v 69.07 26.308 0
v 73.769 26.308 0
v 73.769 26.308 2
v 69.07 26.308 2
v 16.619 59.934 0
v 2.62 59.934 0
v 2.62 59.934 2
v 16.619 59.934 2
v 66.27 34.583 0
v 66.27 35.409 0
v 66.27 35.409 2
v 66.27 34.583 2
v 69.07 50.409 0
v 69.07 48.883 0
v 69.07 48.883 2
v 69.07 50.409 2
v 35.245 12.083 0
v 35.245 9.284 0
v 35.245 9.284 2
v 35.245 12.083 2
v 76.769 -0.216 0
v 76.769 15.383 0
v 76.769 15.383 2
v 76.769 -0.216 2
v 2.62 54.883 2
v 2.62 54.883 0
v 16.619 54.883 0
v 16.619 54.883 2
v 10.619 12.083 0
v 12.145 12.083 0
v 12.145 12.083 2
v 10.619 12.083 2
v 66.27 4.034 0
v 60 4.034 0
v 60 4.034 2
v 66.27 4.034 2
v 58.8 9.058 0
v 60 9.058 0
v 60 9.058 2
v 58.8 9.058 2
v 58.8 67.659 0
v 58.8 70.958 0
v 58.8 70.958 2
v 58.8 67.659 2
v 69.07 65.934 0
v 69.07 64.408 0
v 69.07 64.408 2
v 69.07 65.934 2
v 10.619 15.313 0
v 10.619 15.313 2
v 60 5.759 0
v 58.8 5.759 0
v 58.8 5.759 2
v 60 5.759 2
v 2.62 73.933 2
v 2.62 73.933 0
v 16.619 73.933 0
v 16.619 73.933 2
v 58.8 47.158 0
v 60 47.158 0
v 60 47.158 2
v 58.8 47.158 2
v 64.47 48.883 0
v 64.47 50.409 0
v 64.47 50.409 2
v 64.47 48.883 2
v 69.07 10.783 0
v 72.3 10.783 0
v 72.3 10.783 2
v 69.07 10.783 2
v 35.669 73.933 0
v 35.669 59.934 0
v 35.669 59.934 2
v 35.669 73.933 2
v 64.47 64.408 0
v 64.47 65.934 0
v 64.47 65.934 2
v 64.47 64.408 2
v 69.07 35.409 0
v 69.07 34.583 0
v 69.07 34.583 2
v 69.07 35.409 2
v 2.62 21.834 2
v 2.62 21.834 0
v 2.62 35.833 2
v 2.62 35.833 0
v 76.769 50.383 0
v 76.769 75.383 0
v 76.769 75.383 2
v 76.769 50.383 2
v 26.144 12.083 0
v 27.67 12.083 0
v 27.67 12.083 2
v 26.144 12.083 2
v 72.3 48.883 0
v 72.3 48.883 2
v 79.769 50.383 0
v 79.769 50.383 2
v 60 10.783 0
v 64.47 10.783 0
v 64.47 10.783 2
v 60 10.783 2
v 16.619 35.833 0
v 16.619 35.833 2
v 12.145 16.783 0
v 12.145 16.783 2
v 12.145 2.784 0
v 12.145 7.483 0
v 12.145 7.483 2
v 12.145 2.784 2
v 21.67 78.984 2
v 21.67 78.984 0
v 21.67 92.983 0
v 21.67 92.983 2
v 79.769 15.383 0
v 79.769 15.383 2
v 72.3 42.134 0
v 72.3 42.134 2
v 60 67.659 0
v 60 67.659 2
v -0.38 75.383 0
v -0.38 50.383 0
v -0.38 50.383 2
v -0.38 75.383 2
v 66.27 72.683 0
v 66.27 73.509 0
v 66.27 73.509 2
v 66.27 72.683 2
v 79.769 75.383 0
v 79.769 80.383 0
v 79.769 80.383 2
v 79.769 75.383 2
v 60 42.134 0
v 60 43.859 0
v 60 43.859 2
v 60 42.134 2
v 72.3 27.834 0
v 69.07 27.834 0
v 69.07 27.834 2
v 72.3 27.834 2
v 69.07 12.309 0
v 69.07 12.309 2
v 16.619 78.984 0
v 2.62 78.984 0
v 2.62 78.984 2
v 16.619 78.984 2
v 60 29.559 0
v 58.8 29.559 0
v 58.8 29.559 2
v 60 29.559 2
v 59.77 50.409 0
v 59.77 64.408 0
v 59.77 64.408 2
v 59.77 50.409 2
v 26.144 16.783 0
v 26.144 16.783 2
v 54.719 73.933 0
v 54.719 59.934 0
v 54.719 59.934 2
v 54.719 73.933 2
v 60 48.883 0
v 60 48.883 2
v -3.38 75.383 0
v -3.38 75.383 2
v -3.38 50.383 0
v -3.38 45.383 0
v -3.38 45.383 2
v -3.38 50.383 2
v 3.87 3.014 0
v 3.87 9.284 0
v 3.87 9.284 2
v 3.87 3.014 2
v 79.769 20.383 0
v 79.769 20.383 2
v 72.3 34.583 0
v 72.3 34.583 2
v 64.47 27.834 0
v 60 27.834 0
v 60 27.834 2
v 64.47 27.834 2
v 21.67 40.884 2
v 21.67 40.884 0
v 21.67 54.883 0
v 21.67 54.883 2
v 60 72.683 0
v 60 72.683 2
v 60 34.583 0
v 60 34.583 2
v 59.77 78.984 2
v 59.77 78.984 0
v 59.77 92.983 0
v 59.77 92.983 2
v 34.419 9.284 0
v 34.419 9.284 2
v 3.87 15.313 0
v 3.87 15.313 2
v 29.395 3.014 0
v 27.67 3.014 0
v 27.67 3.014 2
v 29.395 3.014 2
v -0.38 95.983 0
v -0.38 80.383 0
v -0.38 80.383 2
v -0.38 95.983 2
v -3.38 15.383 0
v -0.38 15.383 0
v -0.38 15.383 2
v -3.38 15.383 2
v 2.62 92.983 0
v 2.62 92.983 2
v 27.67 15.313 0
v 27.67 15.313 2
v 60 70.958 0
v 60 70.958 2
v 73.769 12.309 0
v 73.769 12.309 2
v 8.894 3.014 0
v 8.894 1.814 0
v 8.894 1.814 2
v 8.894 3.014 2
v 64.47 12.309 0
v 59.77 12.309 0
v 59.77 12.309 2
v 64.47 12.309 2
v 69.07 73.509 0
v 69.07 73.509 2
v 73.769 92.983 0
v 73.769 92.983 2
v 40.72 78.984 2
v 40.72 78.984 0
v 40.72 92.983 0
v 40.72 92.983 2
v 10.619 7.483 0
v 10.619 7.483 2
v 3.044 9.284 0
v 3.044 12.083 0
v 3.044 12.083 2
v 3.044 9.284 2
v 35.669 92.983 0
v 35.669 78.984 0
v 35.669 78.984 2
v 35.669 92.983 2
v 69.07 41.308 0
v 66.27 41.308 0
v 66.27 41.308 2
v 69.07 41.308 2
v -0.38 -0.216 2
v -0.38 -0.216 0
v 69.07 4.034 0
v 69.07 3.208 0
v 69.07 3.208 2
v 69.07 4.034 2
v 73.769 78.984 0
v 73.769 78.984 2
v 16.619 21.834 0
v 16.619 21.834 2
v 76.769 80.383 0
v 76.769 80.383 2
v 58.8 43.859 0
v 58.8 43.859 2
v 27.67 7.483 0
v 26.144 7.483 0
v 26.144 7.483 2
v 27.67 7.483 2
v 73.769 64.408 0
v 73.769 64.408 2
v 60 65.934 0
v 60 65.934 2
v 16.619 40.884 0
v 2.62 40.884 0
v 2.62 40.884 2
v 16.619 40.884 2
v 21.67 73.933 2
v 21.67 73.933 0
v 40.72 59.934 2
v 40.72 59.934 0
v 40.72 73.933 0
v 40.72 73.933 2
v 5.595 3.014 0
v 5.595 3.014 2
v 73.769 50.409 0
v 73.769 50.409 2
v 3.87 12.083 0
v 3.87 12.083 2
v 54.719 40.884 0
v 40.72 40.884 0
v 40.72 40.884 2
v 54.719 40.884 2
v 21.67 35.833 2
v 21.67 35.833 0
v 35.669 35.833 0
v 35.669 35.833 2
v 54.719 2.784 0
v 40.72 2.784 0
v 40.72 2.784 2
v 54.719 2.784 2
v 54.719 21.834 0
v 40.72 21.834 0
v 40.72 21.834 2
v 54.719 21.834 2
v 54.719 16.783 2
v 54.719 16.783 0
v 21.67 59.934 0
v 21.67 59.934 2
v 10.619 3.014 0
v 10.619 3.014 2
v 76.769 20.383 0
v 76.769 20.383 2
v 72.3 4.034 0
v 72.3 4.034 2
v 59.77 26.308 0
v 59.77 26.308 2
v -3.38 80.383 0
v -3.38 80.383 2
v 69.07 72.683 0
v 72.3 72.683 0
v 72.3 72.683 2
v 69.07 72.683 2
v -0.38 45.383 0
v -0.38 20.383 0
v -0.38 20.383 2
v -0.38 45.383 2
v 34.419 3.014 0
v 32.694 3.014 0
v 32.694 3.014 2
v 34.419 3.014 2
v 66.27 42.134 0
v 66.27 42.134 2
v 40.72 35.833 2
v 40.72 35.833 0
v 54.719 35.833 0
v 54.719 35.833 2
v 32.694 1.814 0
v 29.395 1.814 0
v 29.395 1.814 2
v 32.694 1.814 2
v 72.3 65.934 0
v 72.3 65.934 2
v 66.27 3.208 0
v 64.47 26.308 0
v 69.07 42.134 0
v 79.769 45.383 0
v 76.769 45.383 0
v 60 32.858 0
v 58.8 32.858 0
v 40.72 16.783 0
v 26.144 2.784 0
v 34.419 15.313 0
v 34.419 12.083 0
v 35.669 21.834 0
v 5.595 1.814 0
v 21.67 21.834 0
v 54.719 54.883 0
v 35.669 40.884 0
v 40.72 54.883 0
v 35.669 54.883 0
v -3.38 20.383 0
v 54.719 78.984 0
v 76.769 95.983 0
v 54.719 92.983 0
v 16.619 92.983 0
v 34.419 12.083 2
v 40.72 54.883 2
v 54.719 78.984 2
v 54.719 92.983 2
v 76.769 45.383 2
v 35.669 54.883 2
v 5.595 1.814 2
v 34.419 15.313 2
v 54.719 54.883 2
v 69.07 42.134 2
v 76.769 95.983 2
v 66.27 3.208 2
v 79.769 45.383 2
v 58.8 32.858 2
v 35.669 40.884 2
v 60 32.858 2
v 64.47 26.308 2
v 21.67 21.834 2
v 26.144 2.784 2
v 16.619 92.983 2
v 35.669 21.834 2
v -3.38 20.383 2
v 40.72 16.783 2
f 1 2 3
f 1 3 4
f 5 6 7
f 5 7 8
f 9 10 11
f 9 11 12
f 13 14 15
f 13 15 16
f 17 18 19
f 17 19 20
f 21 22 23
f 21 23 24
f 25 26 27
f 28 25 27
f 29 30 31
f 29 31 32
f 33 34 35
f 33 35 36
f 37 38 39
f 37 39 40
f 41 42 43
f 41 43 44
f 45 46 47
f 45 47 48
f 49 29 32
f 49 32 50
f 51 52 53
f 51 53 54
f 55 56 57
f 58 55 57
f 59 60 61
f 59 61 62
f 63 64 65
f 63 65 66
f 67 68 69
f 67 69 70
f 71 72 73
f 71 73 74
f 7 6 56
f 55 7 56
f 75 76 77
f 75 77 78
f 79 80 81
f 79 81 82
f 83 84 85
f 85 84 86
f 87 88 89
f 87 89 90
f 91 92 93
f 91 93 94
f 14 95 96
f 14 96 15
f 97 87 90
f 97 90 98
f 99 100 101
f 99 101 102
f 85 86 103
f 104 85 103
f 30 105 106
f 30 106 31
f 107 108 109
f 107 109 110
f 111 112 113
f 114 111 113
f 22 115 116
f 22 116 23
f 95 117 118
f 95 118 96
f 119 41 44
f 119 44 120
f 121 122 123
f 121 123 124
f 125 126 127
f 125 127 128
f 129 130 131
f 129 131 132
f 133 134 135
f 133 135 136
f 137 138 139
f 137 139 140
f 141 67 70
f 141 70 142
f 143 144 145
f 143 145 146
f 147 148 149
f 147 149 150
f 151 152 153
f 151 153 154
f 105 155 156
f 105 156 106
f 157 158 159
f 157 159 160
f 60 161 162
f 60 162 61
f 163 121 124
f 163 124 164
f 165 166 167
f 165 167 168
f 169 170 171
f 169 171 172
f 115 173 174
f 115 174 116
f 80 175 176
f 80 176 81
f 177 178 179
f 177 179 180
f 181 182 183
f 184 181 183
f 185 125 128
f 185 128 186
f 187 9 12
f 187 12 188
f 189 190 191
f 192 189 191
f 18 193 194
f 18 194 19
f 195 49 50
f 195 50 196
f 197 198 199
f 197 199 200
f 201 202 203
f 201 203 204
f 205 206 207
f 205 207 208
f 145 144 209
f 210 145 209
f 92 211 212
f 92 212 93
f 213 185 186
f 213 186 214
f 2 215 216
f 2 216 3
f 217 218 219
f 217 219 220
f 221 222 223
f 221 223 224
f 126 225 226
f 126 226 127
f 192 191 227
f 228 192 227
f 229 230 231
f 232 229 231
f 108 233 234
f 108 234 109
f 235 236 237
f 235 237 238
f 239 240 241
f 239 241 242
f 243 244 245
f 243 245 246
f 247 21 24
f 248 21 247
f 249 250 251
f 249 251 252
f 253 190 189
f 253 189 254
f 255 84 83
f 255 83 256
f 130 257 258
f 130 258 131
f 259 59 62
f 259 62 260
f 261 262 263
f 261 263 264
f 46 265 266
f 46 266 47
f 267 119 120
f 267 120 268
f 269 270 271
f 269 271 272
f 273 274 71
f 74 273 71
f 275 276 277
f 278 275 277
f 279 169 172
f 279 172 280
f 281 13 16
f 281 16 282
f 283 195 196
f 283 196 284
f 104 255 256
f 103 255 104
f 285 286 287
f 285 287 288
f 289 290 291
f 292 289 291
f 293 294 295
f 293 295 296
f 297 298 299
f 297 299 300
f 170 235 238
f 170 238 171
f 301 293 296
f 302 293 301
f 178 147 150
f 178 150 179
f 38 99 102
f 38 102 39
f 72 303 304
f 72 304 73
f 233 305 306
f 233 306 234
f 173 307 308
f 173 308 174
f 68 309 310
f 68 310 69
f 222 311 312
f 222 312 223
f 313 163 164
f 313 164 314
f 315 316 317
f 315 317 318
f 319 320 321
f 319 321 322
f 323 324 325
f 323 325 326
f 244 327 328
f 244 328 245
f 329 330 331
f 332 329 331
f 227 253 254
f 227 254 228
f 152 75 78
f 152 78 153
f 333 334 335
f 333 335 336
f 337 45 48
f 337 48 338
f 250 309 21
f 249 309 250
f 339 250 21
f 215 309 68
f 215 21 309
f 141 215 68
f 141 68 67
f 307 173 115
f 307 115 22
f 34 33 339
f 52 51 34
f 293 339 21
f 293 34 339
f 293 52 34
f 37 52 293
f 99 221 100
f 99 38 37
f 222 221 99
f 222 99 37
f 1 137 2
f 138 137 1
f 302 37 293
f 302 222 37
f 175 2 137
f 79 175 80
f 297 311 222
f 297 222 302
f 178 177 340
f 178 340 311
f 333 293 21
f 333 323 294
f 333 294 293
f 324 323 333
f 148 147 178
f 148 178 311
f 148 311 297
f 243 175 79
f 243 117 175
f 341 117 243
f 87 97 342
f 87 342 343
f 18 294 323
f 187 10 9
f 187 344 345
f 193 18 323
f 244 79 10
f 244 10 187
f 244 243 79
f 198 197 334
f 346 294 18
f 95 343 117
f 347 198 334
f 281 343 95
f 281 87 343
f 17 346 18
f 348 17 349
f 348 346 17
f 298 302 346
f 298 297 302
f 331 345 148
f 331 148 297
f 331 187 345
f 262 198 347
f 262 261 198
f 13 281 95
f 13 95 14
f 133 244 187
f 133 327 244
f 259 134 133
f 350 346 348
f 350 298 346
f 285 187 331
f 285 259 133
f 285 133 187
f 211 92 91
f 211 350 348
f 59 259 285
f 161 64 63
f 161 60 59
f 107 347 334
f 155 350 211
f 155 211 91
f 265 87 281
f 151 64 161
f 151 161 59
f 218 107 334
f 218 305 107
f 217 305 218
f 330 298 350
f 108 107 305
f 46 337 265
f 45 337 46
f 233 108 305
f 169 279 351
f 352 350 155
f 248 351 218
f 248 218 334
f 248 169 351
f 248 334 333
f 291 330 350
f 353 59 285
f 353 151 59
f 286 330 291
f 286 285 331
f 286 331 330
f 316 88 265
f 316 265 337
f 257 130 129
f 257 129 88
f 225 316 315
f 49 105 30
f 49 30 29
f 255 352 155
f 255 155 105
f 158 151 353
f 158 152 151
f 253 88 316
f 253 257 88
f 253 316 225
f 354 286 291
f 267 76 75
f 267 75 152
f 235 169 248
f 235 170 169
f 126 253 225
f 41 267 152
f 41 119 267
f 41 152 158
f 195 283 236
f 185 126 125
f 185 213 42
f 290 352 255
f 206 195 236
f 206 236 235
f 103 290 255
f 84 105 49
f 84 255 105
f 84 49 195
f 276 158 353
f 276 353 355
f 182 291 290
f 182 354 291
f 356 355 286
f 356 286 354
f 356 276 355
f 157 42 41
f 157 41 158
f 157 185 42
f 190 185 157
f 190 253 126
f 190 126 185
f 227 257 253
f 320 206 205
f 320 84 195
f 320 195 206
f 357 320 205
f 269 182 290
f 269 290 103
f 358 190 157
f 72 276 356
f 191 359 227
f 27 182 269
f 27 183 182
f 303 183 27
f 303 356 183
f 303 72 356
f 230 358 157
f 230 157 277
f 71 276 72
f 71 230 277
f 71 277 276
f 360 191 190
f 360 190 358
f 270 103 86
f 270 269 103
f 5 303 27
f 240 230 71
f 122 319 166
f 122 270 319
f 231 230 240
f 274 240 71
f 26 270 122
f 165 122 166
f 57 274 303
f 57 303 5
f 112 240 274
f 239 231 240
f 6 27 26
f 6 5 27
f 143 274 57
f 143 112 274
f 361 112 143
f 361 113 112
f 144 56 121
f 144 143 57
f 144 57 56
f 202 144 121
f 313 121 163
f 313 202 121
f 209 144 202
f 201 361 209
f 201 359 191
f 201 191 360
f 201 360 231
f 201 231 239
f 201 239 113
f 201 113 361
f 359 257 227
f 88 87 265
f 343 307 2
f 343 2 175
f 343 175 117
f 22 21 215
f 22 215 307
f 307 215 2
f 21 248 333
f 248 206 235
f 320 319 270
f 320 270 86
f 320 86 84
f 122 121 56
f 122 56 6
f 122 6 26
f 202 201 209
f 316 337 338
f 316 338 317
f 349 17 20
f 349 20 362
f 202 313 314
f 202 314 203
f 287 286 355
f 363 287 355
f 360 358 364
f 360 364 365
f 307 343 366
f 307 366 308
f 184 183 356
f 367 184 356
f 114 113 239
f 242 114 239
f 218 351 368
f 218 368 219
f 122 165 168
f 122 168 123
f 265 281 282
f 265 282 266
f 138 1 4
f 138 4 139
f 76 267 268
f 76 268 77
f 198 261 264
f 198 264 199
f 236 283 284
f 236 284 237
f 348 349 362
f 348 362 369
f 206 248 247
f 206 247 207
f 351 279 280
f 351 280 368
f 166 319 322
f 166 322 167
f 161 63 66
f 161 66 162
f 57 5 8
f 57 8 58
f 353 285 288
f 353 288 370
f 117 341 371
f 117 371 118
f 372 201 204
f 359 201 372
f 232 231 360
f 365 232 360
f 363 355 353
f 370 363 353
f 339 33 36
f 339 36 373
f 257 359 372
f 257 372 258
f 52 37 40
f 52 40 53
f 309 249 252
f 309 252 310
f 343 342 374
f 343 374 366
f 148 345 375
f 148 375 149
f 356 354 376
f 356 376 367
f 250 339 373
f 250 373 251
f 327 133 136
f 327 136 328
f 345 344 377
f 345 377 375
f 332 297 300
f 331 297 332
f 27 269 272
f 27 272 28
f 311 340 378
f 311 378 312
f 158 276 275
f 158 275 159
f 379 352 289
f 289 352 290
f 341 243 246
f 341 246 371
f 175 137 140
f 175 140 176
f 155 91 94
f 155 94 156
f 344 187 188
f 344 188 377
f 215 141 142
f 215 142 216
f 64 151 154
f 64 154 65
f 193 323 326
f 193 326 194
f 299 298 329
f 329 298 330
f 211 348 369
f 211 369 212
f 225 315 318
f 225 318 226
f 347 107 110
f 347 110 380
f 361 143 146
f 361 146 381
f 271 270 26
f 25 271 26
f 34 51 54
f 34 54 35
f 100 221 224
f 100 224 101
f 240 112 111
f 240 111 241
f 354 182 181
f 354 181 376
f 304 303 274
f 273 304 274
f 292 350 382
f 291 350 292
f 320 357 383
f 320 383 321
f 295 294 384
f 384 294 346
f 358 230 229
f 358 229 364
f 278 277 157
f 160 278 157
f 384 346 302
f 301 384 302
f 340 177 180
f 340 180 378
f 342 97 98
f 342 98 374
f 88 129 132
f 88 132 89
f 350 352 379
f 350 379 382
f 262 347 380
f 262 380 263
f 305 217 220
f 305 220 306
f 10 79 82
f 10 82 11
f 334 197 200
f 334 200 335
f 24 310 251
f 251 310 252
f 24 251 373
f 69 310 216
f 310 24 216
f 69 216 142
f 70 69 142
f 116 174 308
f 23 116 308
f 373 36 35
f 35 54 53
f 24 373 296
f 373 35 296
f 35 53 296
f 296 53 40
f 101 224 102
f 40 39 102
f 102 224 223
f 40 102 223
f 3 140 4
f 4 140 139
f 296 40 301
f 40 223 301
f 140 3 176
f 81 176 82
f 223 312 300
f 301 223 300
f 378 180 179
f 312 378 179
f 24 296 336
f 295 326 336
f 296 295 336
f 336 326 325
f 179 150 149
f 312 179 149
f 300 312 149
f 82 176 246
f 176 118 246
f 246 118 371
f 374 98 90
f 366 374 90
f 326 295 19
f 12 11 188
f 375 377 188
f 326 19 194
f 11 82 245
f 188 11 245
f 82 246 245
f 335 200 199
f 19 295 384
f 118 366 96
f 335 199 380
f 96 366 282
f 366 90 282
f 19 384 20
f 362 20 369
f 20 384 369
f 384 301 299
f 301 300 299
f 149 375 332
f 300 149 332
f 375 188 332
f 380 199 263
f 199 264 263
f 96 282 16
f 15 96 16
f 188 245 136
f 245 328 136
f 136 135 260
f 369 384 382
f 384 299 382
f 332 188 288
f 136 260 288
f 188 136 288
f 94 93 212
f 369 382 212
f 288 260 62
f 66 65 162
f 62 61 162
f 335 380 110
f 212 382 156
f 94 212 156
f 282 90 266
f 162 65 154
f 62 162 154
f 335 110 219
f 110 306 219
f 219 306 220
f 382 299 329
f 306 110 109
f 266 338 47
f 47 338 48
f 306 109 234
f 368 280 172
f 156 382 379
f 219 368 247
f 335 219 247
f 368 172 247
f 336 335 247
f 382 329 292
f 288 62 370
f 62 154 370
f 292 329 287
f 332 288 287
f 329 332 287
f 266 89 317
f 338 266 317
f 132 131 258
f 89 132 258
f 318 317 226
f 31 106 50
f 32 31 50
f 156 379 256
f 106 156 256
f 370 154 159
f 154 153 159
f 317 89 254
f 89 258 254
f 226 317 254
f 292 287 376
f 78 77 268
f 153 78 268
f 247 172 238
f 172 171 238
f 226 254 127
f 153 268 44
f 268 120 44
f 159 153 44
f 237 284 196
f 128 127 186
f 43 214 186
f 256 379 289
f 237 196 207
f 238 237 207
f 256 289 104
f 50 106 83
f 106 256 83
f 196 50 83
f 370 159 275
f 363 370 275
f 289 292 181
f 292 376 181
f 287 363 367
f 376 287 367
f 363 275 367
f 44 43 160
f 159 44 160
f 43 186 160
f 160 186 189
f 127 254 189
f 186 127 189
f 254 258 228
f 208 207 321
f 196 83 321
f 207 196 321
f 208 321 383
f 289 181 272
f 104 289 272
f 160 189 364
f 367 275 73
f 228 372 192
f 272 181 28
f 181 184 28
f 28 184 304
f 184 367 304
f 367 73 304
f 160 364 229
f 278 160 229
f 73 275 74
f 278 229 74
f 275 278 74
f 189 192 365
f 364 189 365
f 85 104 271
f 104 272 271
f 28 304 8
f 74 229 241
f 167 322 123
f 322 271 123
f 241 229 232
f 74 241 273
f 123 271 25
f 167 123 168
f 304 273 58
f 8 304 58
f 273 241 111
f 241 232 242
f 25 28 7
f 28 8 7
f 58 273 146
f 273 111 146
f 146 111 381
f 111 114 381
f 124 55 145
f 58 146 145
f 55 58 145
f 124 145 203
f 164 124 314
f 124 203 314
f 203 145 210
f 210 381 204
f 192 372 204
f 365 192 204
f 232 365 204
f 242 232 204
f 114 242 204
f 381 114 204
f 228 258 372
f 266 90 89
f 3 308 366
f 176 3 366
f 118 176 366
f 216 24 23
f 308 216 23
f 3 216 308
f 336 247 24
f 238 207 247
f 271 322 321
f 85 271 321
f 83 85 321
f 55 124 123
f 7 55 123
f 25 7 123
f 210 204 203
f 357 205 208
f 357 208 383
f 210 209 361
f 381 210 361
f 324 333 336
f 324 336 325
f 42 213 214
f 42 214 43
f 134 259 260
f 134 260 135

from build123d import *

# Parameters (mm, degrees)
MODEL_W         = 13.9993
MODEL_H         = 13.99946
MODEL_W_2       = 13.99955
MODEL_H_2       = 13.9994
MODEL_H_3       = 13.9993
EXTRUDE_1_DEPTH = 2


with BuildPart() as part:
    # Model → 凸台-拉伸1 (new body)
    with BuildSketch(Plane.XY):
        Polygon((-0.38035, 95.9831), (76.769, 95.9831), (76.769, 80.38337), (79.769, 80.38337), (79.769, 75.38337), (76.769, 75.38337), (76.769, 50.38337), (79.769, 50.38337), (79.769, 45.38337), (76.769, 45.38337), (76.769, 20.38337), (79.769, 20.38337), (79.769, 15.38337), (76.769, 15.38337), (76.769, -0.21636), (-0.38035, -0.21636), (-0.38035, 15.38337), (-3.38035, 15.38337), (-3.38035, 20.38337), (-0.38035, 20.38337), (-0.38035, 45.38337), (-3.38035, 45.38337), (-3.38035, 50.38337), (-0.38035, 50.38337), (-0.38035, 75.38337), (-3.38035, 75.38337), (-3.38035, 80.38337), (-0.38035, 80.38337), align=None)
        Polygon((12.1447, 16.7831), (12.1447, 12.0826), (10.6192, 12.0826), (10.6192, 15.3128), (3.86955, 15.3128), (3.86955, 12.0826), (3.04409, 12.0826), (3.04409, 9.28384), (3.86955, 9.28384), (3.86955, 3.01377), (5.59484, 3.01377), (5.59484, 1.8135), (8.89385, 1.8135), (8.89385, 3.01377), (10.6192, 3.01377), (10.6192, 7.48273), (12.1447, 7.48273), (12.1447, 2.78364), (26.1441, 2.78364), (26.1441, 7.48273), (27.6696, 7.48273), (27.6696, 3.01377), (29.3949, 3.01377), (29.3949, 1.8135), (32.694, 1.8135), (32.694, 3.01377), (34.4193, 3.01377), (34.4193, 9.28384), (35.2447, 9.28384), (35.2447, 12.0826), (34.4193, 12.0826), (34.4193, 15.3128), (27.6696, 15.3128), (27.6696, 12.0826), (26.1441, 12.0826), (26.1441, 16.7831), align=None, mode=Mode.SUBTRACT)
        with Locations((47.71935, 9.78337)):
            Rectangle(MODEL_W, MODEL_H, mode=Mode.SUBTRACT)
        Polygon((66.27, 35.4087), (66.27, 34.5833), (59.9997, 34.5833), (59.9997, 32.8579), (58.7996, 32.8579), (58.7996, 29.5589), (59.9997, 29.5589), (59.9997, 27.8336), (64.4701, 27.8336), (64.4701, 26.3081), (59.7697, 26.3081), (59.7697, 12.3086), (64.4701, 12.3086), (64.4701, 10.7831), (59.9997, 10.7831), (59.9997, 9.05785), (58.7996, 9.05785), (58.7996, 5.75881), (59.9997, 5.75881), (59.9997, 4.03352), (66.27, 4.03352), (66.27, 3.20807), (69.07, 3.20807), (69.07, 4.03352), (72.3, 4.03352), (72.3, 10.7831), (69.07, 10.7831), (69.07, 12.3086), (73.769, 12.3086), (73.769, 26.3081), (69.07, 26.3081), (69.07, 27.8336), (72.3, 27.8336), (72.3, 34.5833), (69.07, 34.5833), (69.07, 35.4087), align=None, mode=Mode.SUBTRACT)
        with Locations((9.619425, 28.8333)):
            Rectangle(MODEL_W_2, MODEL_H_2, mode=Mode.SUBTRACT)
        with Locations((28.66935, 28.8333)):
            Rectangle(MODEL_W, MODEL_H_2, mode=Mode.SUBTRACT)
        with Locations((47.71935, 28.8333)):
            Rectangle(MODEL_W, MODEL_H_2, mode=Mode.SUBTRACT)
        with Locations((9.619425, 47.88345)):
            Rectangle(MODEL_W_2, MODEL_H_3, mode=Mode.SUBTRACT)
        with Locations((28.66935, 47.88345)):
            Rectangle(MODEL_W, MODEL_H_3, mode=Mode.SUBTRACT)
        with Locations((47.71935, 47.88345)):
            Rectangle(MODEL_W, MODEL_H_3, mode=Mode.SUBTRACT)
        Polygon((66.27, 73.5087), (66.27, 72.6832), (59.9997, 72.6832), (59.9997, 70.9581), (58.7996, 70.9581), (58.7996, 67.6589), (59.9997, 67.6589), (59.9997, 65.9335), (64.4701, 65.9335), (64.4701, 64.4081), (59.7697, 64.4081), (59.7697, 50.4088), (64.4701, 50.4088), (64.4701, 48.883), (59.9997, 48.883), (59.9997, 47.1579), (58.7996, 47.1579), (58.7996, 43.8587), (59.9997, 43.8587), (59.9997, 42.1337), (66.27, 42.1337), (66.27, 41.3082), (69.07, 41.3082), (69.07, 42.1337), (72.3, 42.1337), (72.3, 48.883), (69.07, 48.883), (69.07, 50.4088), (73.769, 50.4088), (73.769, 64.4081), (69.07, 64.4081), (69.07, 65.9335), (72.3, 65.9335), (72.3, 72.6832), (69.07, 72.6832), (69.07, 73.5087), align=None, mode=Mode.SUBTRACT)
        with Locations((9.619425, 66.93345)):
            Rectangle(MODEL_W_2, MODEL_H_3, mode=Mode.SUBTRACT)
        with Locations((28.66935, 66.93345)):
            Rectangle(MODEL_W, MODEL_H_3, mode=Mode.SUBTRACT)
        with Locations((47.71935, 66.93345)):
            Rectangle(MODEL_W, MODEL_H_3, mode=Mode.SUBTRACT)
        with Locations((9.619425, 85.98345)):
            Rectangle(MODEL_W_2, MODEL_H_3, mode=Mode.SUBTRACT)
        with Locations((28.66935, 85.98345)):
            Rectangle(MODEL_W, MODEL_H_3, mode=Mode.SUBTRACT)
        with Locations((47.71935, 85.98345)):
            Rectangle(MODEL_W, MODEL_H_3, mode=Mode.SUBTRACT)
        with Locations((66.76935, 85.98345)):
            Rectangle(MODEL_W, MODEL_H_3, mode=Mode.SUBTRACT)
    extrude(amount=EXTRUDE_1_DEPTH)


solid = part.part
